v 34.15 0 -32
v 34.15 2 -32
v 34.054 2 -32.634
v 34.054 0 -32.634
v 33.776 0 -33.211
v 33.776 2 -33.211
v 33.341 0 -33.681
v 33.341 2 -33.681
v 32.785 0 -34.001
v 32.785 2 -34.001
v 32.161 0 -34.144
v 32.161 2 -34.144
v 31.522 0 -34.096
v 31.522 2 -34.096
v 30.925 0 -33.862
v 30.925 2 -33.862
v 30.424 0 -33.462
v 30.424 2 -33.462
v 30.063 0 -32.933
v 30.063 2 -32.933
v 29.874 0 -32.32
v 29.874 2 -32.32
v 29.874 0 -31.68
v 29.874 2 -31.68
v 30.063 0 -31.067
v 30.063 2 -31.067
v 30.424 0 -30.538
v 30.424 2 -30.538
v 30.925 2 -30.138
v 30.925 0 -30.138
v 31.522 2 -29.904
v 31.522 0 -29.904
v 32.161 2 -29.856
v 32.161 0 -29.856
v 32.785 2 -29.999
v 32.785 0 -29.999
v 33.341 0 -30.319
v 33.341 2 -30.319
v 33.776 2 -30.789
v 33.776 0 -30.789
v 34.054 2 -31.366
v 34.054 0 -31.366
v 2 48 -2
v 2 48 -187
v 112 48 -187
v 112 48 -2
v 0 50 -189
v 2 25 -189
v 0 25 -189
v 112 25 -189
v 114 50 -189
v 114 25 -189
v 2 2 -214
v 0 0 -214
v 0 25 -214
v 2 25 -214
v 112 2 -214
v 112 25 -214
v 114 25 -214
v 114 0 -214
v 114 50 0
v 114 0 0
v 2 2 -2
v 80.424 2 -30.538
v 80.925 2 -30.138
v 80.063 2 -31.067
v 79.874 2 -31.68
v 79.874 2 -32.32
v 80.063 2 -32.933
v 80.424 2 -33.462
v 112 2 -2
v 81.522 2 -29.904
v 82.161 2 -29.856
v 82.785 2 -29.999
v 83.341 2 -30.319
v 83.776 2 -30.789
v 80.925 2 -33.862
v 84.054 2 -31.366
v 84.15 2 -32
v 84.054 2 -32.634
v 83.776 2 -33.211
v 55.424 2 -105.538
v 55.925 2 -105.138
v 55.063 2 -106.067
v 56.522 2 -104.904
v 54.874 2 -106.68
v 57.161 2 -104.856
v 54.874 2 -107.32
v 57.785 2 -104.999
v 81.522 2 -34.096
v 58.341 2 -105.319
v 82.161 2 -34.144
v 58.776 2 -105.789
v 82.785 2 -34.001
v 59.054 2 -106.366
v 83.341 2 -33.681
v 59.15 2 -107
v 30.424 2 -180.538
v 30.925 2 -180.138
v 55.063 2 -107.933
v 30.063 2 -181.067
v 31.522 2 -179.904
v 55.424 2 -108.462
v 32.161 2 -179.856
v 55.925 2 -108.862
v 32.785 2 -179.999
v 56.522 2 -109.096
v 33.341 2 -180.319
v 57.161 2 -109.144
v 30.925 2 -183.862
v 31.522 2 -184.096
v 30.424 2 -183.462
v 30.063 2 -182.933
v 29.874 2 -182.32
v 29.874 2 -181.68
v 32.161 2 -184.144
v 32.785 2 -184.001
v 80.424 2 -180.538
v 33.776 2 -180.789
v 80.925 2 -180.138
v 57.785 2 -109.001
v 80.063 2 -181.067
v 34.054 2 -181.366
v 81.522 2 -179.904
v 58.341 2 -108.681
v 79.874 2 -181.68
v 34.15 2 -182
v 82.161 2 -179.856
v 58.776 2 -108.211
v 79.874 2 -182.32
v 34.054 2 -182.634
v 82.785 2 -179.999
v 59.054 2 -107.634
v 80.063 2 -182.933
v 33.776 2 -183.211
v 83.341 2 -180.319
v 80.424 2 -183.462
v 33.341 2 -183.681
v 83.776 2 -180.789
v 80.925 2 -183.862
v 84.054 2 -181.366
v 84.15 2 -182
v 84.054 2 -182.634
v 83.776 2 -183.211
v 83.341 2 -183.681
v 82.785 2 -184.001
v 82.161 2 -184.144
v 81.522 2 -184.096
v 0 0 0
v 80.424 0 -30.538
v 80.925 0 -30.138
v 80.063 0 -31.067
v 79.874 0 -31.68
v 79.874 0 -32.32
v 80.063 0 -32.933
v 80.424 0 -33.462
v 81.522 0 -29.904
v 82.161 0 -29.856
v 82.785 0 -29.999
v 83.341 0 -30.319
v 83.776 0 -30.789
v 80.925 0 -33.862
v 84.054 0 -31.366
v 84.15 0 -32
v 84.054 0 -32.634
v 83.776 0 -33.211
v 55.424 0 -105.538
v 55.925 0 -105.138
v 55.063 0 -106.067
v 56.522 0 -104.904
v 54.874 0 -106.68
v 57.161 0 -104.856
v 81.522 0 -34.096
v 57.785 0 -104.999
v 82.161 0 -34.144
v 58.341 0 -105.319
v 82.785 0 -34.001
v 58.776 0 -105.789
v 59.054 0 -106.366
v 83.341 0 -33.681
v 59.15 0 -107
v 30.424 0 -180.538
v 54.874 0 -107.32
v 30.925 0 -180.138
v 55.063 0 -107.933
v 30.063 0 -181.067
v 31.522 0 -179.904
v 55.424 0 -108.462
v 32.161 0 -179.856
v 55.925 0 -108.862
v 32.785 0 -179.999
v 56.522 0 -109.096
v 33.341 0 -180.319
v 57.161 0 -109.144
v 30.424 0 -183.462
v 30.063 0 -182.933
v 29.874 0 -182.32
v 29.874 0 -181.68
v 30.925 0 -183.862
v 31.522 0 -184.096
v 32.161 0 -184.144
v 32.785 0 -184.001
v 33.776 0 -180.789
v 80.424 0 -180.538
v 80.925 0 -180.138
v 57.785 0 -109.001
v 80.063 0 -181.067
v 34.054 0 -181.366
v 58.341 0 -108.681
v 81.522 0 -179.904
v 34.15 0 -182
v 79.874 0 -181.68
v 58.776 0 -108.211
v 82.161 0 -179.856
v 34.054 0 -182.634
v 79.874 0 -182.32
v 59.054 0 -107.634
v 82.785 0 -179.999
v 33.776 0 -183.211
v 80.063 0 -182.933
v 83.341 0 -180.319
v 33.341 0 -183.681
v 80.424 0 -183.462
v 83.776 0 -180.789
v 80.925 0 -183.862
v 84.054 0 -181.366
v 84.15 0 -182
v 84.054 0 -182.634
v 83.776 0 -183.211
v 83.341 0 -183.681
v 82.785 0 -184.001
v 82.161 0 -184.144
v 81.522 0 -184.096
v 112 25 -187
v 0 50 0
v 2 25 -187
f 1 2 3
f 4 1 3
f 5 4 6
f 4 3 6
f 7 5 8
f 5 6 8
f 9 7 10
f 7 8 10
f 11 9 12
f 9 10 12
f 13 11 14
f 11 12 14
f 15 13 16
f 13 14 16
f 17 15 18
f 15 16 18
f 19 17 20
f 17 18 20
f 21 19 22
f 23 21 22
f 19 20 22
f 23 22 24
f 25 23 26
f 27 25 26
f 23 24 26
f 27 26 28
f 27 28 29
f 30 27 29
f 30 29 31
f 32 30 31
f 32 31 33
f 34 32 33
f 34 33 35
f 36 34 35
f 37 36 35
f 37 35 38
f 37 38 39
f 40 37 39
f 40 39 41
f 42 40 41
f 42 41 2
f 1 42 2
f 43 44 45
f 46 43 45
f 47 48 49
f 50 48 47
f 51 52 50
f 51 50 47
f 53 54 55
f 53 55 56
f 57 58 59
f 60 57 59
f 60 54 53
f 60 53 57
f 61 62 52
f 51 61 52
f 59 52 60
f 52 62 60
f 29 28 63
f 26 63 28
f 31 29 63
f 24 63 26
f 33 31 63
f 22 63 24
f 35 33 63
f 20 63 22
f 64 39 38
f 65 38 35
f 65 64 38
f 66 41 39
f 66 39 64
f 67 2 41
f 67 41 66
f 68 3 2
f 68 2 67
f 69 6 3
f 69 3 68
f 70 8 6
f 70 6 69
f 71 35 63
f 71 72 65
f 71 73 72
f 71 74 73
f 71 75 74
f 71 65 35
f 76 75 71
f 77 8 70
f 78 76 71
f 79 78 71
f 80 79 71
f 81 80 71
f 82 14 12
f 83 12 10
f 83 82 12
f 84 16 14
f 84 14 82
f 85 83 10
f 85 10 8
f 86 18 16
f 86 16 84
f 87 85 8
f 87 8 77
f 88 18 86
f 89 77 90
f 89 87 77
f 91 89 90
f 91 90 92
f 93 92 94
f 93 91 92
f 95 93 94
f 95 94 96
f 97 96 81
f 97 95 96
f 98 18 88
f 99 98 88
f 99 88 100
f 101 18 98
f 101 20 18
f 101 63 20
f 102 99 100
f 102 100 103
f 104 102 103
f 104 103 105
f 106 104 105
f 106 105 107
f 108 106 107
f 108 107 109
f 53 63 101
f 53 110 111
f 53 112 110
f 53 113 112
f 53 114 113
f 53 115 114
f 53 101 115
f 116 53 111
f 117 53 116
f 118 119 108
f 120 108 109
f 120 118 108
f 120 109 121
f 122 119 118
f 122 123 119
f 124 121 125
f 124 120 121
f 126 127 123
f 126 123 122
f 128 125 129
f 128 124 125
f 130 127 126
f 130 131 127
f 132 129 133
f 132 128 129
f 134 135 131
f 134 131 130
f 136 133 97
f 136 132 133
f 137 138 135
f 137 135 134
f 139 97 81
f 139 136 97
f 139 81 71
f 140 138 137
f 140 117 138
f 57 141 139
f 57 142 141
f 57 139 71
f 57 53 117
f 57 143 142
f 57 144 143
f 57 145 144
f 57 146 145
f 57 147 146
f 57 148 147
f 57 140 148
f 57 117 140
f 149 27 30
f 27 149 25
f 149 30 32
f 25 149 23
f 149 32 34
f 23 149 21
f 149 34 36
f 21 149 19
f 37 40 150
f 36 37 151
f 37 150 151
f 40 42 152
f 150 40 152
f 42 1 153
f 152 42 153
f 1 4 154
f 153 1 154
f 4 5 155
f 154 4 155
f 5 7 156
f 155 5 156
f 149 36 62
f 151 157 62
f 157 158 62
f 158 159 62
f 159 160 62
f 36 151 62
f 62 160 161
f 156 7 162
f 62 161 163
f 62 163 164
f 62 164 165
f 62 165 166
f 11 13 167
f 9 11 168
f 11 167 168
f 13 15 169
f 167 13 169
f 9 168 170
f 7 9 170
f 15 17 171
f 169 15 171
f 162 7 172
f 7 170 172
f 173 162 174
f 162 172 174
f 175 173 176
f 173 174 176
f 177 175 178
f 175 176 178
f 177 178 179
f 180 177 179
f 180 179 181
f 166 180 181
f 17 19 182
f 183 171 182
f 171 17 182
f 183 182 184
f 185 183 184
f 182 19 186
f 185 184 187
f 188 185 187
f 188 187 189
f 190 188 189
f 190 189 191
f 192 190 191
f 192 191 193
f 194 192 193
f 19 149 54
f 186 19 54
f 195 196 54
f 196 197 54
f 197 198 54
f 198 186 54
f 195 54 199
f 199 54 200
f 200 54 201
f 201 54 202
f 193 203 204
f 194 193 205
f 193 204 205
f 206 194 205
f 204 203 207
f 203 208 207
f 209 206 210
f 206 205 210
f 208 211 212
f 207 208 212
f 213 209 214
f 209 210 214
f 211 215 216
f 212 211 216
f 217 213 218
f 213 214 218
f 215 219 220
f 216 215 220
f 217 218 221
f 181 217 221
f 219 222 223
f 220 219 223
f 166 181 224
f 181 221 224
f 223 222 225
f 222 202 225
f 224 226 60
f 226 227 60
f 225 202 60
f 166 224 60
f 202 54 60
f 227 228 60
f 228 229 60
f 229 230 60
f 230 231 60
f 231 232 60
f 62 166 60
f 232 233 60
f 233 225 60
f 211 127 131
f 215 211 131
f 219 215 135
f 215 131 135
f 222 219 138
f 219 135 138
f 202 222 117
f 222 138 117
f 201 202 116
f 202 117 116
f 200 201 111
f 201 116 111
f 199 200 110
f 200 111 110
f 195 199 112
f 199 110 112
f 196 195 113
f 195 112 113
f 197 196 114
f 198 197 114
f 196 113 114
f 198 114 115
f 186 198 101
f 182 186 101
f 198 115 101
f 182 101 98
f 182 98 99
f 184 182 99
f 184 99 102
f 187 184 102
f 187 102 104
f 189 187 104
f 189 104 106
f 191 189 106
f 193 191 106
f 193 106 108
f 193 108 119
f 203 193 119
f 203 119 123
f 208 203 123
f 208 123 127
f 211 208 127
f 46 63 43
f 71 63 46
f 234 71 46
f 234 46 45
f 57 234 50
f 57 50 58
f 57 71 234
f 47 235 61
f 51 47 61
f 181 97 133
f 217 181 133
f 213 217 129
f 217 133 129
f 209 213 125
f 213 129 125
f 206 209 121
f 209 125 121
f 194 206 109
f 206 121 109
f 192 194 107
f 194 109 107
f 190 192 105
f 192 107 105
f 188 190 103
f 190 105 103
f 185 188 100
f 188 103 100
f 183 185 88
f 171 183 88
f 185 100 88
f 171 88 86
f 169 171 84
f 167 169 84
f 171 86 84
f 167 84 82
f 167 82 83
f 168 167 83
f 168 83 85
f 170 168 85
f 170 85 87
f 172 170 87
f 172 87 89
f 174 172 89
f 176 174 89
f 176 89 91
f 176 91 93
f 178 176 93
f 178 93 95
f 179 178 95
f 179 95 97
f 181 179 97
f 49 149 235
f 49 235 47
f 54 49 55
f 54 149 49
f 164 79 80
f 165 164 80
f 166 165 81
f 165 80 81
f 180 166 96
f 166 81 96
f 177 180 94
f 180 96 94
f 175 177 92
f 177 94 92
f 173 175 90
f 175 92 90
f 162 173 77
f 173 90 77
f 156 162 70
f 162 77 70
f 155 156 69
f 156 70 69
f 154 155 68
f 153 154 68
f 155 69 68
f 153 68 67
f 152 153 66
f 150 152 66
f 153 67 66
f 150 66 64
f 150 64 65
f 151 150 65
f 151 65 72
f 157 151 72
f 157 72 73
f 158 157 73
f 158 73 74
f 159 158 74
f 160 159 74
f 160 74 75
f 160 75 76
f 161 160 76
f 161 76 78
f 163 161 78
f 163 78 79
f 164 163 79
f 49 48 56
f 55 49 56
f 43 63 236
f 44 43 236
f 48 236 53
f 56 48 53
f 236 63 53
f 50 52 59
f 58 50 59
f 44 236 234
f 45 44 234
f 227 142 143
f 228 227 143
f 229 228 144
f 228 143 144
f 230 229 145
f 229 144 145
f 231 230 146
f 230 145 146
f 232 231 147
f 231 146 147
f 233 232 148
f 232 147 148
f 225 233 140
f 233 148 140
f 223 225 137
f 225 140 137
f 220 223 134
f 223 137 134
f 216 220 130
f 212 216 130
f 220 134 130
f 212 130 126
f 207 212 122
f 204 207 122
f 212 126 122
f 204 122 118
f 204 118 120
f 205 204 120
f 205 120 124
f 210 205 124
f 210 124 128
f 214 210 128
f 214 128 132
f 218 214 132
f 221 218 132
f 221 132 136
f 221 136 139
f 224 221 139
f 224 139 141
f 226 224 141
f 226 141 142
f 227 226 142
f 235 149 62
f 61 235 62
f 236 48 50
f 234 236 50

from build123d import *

# Parameters (mm, degrees)
SKETCH1_W                = 114
SKETCH1_H                = 214
BOSS_EXTRUDE1_DEPTH      = 50
SKETCH4_W                = 25
SKETCH4_H                = 25
CUT_EXTRUDE1_DEPTH       = 248.572211688
SHELL1_START             = 2
SHELL1_OUTLINE_W         = 110
SHELL1_OUTLINE_H         = 185
SHELL1_DEPTH             = 46
SHELL1_2_OUTLINE_W       = 110
SHELL1_2_OUTLINE_H       = 27
SHELL1_2_DEPTH           = 23
M4_CLEARANCE_HOLE1_D     = 4.3
M4_CLEARANCE_HOLE1_DEPTH = 4
M4_CLEARANCE_HOLE1_TIP   = 1.291850331


# Read off the part's stored shape, not the designer's step: Shell1
with BuildPart() as part:
    # Sketch1 → Boss-Extrude1 (new body)
    with BuildSketch(Plane(origin=(0, 0, 0), x_dir=(1, 0, 0), z_dir=(0, 1, 0))):
        with Locations((57, 107)):
            Rectangle(SKETCH1_W, SKETCH1_H)
    extrude(amount=BOSS_EXTRUDE1_DEPTH)

    # Sketch4 → Cut-Extrude1 (cut, through all)
    with BuildSketch(Plane(origin=(114, 0, 0), x_dir=(0, 0, -1), z_dir=(1, 0, 0))):
        with Locations((201.5, 37.5)):
            Rectangle(SKETCH4_W, SKETCH4_H)
    extrude(amount=-CUT_EXTRUDE1_DEPTH, mode=Mode.SUBTRACT)

    # Shell1 outline → Shell1 (cut)
    with BuildSketch(Plane(origin=(0, 0, 0), x_dir=(1, 0, 0), z_dir=(0, 1, 0)).offset(SHELL1_START)):
        with Locations((57, 94.5)):
            Rectangle(SHELL1_OUTLINE_W, SHELL1_OUTLINE_H)
    extrude(amount=SHELL1_DEPTH, mode=Mode.SUBTRACT)

    # Shell1 2 outline → Shell1 2 (cut)
    with BuildSketch(Plane(origin=(0, 0, 0), x_dir=(1, 0, 0), z_dir=(0, 1, 0)).offset(SHELL1_START)):
        with Locations((57, 200.5)):
            Rectangle(SHELL1_2_OUTLINE_W, SHELL1_2_OUTLINE_H)
    extrude(amount=SHELL1_2_DEPTH, mode=Mode.SUBTRACT)

    # M4 Clearance Hole1
    with Locations(Plane(origin=(0, 0, 0), x_dir=(-1, 0, 0), z_dir=(0, -1, 0))):
        with Locations((-32, 32), (-57, 107), (-32, 182), (-82, 32), (-82, 182)):
            Hole(M4_CLEARANCE_HOLE1_D / 2, depth=M4_CLEARANCE_HOLE1_DEPTH)
            with Locations((0, 0, -(M4_CLEARANCE_HOLE1_DEPTH + M4_CLEARANCE_HOLE1_TIP / 2))):  # 118° drill point
                Cone(0, M4_CLEARANCE_HOLE1_D / 2, M4_CLEARANCE_HOLE1_TIP, mode=Mode.SUBTRACT)


solid = part.part
